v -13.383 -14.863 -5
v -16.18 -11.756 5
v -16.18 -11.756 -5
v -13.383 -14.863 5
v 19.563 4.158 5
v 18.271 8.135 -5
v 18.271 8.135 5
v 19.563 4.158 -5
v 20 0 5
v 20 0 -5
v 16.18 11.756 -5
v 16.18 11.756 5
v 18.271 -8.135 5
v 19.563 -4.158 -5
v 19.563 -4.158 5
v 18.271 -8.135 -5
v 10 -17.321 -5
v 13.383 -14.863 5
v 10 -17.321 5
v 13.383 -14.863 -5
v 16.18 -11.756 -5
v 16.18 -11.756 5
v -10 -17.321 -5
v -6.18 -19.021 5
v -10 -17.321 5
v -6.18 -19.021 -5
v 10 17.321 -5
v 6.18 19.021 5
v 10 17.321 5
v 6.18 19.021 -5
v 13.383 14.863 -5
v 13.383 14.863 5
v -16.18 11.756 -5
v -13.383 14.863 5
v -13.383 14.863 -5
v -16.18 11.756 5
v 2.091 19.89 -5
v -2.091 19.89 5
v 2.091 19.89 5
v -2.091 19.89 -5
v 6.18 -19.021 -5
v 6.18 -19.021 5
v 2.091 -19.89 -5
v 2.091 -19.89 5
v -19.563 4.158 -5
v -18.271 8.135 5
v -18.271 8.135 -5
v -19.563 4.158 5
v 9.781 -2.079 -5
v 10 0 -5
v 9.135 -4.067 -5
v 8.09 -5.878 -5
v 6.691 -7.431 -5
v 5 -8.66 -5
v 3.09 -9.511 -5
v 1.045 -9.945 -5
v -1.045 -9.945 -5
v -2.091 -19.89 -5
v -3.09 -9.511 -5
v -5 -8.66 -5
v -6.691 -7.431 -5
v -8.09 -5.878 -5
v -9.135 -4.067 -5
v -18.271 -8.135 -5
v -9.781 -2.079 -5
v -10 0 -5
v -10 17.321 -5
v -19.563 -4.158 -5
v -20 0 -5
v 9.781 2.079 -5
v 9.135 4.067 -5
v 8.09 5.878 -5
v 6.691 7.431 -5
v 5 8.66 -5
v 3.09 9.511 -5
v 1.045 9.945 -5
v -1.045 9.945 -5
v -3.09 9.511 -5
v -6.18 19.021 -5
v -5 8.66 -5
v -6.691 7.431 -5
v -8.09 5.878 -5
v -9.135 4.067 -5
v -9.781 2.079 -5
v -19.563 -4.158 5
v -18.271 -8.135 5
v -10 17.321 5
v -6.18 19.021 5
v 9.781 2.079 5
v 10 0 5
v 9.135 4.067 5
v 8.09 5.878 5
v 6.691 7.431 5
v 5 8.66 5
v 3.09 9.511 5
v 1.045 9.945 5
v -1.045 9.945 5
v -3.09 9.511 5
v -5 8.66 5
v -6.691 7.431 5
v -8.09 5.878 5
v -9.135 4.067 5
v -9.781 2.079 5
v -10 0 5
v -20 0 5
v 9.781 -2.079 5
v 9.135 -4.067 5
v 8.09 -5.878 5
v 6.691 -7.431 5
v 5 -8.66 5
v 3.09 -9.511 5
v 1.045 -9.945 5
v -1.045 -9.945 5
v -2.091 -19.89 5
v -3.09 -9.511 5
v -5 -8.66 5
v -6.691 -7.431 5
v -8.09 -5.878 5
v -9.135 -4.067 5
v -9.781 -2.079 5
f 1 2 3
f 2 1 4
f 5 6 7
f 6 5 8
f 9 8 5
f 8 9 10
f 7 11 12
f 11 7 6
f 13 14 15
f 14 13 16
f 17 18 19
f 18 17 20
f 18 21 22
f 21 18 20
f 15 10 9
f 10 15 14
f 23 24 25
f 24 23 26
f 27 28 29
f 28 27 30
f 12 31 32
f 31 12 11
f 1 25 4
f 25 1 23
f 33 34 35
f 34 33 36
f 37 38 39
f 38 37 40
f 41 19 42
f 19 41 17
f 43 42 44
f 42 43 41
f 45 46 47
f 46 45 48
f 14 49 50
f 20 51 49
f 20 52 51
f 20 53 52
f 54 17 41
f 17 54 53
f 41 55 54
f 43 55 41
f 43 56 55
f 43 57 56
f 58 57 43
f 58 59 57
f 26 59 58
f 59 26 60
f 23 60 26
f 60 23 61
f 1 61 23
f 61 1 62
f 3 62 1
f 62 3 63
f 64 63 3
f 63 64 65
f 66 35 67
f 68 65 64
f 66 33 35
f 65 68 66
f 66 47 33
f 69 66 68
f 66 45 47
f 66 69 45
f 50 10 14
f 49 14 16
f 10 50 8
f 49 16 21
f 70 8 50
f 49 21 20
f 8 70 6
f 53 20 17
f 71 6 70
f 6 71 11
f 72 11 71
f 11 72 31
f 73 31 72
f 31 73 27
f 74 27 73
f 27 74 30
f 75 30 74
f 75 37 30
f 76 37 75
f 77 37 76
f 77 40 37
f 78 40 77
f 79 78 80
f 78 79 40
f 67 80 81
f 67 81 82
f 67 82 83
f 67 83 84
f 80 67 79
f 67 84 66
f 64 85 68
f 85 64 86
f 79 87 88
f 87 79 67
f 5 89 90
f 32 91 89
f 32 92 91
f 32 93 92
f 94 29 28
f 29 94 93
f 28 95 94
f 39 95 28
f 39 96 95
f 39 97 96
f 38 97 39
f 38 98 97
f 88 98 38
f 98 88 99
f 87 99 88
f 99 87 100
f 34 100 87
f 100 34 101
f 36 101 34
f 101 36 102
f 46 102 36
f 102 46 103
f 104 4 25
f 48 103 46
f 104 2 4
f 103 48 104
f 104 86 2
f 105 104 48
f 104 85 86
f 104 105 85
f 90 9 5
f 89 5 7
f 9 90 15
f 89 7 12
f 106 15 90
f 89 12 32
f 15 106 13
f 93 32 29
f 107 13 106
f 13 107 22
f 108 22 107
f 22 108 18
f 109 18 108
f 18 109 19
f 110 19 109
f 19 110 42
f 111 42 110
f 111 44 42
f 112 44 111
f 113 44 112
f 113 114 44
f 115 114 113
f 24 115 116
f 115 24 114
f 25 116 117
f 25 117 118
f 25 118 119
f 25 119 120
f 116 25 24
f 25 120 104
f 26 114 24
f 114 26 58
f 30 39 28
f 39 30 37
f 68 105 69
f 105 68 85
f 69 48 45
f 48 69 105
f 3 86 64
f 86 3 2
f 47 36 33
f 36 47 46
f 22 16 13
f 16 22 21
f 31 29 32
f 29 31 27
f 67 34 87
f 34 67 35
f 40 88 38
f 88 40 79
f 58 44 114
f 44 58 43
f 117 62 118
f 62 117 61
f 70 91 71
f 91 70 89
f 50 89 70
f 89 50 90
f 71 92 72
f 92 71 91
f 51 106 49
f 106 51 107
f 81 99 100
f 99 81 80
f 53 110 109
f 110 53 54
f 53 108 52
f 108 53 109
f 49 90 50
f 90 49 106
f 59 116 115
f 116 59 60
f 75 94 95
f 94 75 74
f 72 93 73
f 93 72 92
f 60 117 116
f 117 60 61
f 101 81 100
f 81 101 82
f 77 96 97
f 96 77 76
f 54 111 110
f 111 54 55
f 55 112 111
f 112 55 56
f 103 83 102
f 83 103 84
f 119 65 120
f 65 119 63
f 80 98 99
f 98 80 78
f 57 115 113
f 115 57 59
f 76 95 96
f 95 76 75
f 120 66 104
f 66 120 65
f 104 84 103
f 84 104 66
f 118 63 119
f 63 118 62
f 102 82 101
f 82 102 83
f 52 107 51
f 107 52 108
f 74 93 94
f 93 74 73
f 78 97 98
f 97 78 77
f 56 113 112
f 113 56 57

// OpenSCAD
difference() {
    cylinder(h = 10, r = 20, center = true);
    cylinder(h = 10, r = 10, center = true);
}
